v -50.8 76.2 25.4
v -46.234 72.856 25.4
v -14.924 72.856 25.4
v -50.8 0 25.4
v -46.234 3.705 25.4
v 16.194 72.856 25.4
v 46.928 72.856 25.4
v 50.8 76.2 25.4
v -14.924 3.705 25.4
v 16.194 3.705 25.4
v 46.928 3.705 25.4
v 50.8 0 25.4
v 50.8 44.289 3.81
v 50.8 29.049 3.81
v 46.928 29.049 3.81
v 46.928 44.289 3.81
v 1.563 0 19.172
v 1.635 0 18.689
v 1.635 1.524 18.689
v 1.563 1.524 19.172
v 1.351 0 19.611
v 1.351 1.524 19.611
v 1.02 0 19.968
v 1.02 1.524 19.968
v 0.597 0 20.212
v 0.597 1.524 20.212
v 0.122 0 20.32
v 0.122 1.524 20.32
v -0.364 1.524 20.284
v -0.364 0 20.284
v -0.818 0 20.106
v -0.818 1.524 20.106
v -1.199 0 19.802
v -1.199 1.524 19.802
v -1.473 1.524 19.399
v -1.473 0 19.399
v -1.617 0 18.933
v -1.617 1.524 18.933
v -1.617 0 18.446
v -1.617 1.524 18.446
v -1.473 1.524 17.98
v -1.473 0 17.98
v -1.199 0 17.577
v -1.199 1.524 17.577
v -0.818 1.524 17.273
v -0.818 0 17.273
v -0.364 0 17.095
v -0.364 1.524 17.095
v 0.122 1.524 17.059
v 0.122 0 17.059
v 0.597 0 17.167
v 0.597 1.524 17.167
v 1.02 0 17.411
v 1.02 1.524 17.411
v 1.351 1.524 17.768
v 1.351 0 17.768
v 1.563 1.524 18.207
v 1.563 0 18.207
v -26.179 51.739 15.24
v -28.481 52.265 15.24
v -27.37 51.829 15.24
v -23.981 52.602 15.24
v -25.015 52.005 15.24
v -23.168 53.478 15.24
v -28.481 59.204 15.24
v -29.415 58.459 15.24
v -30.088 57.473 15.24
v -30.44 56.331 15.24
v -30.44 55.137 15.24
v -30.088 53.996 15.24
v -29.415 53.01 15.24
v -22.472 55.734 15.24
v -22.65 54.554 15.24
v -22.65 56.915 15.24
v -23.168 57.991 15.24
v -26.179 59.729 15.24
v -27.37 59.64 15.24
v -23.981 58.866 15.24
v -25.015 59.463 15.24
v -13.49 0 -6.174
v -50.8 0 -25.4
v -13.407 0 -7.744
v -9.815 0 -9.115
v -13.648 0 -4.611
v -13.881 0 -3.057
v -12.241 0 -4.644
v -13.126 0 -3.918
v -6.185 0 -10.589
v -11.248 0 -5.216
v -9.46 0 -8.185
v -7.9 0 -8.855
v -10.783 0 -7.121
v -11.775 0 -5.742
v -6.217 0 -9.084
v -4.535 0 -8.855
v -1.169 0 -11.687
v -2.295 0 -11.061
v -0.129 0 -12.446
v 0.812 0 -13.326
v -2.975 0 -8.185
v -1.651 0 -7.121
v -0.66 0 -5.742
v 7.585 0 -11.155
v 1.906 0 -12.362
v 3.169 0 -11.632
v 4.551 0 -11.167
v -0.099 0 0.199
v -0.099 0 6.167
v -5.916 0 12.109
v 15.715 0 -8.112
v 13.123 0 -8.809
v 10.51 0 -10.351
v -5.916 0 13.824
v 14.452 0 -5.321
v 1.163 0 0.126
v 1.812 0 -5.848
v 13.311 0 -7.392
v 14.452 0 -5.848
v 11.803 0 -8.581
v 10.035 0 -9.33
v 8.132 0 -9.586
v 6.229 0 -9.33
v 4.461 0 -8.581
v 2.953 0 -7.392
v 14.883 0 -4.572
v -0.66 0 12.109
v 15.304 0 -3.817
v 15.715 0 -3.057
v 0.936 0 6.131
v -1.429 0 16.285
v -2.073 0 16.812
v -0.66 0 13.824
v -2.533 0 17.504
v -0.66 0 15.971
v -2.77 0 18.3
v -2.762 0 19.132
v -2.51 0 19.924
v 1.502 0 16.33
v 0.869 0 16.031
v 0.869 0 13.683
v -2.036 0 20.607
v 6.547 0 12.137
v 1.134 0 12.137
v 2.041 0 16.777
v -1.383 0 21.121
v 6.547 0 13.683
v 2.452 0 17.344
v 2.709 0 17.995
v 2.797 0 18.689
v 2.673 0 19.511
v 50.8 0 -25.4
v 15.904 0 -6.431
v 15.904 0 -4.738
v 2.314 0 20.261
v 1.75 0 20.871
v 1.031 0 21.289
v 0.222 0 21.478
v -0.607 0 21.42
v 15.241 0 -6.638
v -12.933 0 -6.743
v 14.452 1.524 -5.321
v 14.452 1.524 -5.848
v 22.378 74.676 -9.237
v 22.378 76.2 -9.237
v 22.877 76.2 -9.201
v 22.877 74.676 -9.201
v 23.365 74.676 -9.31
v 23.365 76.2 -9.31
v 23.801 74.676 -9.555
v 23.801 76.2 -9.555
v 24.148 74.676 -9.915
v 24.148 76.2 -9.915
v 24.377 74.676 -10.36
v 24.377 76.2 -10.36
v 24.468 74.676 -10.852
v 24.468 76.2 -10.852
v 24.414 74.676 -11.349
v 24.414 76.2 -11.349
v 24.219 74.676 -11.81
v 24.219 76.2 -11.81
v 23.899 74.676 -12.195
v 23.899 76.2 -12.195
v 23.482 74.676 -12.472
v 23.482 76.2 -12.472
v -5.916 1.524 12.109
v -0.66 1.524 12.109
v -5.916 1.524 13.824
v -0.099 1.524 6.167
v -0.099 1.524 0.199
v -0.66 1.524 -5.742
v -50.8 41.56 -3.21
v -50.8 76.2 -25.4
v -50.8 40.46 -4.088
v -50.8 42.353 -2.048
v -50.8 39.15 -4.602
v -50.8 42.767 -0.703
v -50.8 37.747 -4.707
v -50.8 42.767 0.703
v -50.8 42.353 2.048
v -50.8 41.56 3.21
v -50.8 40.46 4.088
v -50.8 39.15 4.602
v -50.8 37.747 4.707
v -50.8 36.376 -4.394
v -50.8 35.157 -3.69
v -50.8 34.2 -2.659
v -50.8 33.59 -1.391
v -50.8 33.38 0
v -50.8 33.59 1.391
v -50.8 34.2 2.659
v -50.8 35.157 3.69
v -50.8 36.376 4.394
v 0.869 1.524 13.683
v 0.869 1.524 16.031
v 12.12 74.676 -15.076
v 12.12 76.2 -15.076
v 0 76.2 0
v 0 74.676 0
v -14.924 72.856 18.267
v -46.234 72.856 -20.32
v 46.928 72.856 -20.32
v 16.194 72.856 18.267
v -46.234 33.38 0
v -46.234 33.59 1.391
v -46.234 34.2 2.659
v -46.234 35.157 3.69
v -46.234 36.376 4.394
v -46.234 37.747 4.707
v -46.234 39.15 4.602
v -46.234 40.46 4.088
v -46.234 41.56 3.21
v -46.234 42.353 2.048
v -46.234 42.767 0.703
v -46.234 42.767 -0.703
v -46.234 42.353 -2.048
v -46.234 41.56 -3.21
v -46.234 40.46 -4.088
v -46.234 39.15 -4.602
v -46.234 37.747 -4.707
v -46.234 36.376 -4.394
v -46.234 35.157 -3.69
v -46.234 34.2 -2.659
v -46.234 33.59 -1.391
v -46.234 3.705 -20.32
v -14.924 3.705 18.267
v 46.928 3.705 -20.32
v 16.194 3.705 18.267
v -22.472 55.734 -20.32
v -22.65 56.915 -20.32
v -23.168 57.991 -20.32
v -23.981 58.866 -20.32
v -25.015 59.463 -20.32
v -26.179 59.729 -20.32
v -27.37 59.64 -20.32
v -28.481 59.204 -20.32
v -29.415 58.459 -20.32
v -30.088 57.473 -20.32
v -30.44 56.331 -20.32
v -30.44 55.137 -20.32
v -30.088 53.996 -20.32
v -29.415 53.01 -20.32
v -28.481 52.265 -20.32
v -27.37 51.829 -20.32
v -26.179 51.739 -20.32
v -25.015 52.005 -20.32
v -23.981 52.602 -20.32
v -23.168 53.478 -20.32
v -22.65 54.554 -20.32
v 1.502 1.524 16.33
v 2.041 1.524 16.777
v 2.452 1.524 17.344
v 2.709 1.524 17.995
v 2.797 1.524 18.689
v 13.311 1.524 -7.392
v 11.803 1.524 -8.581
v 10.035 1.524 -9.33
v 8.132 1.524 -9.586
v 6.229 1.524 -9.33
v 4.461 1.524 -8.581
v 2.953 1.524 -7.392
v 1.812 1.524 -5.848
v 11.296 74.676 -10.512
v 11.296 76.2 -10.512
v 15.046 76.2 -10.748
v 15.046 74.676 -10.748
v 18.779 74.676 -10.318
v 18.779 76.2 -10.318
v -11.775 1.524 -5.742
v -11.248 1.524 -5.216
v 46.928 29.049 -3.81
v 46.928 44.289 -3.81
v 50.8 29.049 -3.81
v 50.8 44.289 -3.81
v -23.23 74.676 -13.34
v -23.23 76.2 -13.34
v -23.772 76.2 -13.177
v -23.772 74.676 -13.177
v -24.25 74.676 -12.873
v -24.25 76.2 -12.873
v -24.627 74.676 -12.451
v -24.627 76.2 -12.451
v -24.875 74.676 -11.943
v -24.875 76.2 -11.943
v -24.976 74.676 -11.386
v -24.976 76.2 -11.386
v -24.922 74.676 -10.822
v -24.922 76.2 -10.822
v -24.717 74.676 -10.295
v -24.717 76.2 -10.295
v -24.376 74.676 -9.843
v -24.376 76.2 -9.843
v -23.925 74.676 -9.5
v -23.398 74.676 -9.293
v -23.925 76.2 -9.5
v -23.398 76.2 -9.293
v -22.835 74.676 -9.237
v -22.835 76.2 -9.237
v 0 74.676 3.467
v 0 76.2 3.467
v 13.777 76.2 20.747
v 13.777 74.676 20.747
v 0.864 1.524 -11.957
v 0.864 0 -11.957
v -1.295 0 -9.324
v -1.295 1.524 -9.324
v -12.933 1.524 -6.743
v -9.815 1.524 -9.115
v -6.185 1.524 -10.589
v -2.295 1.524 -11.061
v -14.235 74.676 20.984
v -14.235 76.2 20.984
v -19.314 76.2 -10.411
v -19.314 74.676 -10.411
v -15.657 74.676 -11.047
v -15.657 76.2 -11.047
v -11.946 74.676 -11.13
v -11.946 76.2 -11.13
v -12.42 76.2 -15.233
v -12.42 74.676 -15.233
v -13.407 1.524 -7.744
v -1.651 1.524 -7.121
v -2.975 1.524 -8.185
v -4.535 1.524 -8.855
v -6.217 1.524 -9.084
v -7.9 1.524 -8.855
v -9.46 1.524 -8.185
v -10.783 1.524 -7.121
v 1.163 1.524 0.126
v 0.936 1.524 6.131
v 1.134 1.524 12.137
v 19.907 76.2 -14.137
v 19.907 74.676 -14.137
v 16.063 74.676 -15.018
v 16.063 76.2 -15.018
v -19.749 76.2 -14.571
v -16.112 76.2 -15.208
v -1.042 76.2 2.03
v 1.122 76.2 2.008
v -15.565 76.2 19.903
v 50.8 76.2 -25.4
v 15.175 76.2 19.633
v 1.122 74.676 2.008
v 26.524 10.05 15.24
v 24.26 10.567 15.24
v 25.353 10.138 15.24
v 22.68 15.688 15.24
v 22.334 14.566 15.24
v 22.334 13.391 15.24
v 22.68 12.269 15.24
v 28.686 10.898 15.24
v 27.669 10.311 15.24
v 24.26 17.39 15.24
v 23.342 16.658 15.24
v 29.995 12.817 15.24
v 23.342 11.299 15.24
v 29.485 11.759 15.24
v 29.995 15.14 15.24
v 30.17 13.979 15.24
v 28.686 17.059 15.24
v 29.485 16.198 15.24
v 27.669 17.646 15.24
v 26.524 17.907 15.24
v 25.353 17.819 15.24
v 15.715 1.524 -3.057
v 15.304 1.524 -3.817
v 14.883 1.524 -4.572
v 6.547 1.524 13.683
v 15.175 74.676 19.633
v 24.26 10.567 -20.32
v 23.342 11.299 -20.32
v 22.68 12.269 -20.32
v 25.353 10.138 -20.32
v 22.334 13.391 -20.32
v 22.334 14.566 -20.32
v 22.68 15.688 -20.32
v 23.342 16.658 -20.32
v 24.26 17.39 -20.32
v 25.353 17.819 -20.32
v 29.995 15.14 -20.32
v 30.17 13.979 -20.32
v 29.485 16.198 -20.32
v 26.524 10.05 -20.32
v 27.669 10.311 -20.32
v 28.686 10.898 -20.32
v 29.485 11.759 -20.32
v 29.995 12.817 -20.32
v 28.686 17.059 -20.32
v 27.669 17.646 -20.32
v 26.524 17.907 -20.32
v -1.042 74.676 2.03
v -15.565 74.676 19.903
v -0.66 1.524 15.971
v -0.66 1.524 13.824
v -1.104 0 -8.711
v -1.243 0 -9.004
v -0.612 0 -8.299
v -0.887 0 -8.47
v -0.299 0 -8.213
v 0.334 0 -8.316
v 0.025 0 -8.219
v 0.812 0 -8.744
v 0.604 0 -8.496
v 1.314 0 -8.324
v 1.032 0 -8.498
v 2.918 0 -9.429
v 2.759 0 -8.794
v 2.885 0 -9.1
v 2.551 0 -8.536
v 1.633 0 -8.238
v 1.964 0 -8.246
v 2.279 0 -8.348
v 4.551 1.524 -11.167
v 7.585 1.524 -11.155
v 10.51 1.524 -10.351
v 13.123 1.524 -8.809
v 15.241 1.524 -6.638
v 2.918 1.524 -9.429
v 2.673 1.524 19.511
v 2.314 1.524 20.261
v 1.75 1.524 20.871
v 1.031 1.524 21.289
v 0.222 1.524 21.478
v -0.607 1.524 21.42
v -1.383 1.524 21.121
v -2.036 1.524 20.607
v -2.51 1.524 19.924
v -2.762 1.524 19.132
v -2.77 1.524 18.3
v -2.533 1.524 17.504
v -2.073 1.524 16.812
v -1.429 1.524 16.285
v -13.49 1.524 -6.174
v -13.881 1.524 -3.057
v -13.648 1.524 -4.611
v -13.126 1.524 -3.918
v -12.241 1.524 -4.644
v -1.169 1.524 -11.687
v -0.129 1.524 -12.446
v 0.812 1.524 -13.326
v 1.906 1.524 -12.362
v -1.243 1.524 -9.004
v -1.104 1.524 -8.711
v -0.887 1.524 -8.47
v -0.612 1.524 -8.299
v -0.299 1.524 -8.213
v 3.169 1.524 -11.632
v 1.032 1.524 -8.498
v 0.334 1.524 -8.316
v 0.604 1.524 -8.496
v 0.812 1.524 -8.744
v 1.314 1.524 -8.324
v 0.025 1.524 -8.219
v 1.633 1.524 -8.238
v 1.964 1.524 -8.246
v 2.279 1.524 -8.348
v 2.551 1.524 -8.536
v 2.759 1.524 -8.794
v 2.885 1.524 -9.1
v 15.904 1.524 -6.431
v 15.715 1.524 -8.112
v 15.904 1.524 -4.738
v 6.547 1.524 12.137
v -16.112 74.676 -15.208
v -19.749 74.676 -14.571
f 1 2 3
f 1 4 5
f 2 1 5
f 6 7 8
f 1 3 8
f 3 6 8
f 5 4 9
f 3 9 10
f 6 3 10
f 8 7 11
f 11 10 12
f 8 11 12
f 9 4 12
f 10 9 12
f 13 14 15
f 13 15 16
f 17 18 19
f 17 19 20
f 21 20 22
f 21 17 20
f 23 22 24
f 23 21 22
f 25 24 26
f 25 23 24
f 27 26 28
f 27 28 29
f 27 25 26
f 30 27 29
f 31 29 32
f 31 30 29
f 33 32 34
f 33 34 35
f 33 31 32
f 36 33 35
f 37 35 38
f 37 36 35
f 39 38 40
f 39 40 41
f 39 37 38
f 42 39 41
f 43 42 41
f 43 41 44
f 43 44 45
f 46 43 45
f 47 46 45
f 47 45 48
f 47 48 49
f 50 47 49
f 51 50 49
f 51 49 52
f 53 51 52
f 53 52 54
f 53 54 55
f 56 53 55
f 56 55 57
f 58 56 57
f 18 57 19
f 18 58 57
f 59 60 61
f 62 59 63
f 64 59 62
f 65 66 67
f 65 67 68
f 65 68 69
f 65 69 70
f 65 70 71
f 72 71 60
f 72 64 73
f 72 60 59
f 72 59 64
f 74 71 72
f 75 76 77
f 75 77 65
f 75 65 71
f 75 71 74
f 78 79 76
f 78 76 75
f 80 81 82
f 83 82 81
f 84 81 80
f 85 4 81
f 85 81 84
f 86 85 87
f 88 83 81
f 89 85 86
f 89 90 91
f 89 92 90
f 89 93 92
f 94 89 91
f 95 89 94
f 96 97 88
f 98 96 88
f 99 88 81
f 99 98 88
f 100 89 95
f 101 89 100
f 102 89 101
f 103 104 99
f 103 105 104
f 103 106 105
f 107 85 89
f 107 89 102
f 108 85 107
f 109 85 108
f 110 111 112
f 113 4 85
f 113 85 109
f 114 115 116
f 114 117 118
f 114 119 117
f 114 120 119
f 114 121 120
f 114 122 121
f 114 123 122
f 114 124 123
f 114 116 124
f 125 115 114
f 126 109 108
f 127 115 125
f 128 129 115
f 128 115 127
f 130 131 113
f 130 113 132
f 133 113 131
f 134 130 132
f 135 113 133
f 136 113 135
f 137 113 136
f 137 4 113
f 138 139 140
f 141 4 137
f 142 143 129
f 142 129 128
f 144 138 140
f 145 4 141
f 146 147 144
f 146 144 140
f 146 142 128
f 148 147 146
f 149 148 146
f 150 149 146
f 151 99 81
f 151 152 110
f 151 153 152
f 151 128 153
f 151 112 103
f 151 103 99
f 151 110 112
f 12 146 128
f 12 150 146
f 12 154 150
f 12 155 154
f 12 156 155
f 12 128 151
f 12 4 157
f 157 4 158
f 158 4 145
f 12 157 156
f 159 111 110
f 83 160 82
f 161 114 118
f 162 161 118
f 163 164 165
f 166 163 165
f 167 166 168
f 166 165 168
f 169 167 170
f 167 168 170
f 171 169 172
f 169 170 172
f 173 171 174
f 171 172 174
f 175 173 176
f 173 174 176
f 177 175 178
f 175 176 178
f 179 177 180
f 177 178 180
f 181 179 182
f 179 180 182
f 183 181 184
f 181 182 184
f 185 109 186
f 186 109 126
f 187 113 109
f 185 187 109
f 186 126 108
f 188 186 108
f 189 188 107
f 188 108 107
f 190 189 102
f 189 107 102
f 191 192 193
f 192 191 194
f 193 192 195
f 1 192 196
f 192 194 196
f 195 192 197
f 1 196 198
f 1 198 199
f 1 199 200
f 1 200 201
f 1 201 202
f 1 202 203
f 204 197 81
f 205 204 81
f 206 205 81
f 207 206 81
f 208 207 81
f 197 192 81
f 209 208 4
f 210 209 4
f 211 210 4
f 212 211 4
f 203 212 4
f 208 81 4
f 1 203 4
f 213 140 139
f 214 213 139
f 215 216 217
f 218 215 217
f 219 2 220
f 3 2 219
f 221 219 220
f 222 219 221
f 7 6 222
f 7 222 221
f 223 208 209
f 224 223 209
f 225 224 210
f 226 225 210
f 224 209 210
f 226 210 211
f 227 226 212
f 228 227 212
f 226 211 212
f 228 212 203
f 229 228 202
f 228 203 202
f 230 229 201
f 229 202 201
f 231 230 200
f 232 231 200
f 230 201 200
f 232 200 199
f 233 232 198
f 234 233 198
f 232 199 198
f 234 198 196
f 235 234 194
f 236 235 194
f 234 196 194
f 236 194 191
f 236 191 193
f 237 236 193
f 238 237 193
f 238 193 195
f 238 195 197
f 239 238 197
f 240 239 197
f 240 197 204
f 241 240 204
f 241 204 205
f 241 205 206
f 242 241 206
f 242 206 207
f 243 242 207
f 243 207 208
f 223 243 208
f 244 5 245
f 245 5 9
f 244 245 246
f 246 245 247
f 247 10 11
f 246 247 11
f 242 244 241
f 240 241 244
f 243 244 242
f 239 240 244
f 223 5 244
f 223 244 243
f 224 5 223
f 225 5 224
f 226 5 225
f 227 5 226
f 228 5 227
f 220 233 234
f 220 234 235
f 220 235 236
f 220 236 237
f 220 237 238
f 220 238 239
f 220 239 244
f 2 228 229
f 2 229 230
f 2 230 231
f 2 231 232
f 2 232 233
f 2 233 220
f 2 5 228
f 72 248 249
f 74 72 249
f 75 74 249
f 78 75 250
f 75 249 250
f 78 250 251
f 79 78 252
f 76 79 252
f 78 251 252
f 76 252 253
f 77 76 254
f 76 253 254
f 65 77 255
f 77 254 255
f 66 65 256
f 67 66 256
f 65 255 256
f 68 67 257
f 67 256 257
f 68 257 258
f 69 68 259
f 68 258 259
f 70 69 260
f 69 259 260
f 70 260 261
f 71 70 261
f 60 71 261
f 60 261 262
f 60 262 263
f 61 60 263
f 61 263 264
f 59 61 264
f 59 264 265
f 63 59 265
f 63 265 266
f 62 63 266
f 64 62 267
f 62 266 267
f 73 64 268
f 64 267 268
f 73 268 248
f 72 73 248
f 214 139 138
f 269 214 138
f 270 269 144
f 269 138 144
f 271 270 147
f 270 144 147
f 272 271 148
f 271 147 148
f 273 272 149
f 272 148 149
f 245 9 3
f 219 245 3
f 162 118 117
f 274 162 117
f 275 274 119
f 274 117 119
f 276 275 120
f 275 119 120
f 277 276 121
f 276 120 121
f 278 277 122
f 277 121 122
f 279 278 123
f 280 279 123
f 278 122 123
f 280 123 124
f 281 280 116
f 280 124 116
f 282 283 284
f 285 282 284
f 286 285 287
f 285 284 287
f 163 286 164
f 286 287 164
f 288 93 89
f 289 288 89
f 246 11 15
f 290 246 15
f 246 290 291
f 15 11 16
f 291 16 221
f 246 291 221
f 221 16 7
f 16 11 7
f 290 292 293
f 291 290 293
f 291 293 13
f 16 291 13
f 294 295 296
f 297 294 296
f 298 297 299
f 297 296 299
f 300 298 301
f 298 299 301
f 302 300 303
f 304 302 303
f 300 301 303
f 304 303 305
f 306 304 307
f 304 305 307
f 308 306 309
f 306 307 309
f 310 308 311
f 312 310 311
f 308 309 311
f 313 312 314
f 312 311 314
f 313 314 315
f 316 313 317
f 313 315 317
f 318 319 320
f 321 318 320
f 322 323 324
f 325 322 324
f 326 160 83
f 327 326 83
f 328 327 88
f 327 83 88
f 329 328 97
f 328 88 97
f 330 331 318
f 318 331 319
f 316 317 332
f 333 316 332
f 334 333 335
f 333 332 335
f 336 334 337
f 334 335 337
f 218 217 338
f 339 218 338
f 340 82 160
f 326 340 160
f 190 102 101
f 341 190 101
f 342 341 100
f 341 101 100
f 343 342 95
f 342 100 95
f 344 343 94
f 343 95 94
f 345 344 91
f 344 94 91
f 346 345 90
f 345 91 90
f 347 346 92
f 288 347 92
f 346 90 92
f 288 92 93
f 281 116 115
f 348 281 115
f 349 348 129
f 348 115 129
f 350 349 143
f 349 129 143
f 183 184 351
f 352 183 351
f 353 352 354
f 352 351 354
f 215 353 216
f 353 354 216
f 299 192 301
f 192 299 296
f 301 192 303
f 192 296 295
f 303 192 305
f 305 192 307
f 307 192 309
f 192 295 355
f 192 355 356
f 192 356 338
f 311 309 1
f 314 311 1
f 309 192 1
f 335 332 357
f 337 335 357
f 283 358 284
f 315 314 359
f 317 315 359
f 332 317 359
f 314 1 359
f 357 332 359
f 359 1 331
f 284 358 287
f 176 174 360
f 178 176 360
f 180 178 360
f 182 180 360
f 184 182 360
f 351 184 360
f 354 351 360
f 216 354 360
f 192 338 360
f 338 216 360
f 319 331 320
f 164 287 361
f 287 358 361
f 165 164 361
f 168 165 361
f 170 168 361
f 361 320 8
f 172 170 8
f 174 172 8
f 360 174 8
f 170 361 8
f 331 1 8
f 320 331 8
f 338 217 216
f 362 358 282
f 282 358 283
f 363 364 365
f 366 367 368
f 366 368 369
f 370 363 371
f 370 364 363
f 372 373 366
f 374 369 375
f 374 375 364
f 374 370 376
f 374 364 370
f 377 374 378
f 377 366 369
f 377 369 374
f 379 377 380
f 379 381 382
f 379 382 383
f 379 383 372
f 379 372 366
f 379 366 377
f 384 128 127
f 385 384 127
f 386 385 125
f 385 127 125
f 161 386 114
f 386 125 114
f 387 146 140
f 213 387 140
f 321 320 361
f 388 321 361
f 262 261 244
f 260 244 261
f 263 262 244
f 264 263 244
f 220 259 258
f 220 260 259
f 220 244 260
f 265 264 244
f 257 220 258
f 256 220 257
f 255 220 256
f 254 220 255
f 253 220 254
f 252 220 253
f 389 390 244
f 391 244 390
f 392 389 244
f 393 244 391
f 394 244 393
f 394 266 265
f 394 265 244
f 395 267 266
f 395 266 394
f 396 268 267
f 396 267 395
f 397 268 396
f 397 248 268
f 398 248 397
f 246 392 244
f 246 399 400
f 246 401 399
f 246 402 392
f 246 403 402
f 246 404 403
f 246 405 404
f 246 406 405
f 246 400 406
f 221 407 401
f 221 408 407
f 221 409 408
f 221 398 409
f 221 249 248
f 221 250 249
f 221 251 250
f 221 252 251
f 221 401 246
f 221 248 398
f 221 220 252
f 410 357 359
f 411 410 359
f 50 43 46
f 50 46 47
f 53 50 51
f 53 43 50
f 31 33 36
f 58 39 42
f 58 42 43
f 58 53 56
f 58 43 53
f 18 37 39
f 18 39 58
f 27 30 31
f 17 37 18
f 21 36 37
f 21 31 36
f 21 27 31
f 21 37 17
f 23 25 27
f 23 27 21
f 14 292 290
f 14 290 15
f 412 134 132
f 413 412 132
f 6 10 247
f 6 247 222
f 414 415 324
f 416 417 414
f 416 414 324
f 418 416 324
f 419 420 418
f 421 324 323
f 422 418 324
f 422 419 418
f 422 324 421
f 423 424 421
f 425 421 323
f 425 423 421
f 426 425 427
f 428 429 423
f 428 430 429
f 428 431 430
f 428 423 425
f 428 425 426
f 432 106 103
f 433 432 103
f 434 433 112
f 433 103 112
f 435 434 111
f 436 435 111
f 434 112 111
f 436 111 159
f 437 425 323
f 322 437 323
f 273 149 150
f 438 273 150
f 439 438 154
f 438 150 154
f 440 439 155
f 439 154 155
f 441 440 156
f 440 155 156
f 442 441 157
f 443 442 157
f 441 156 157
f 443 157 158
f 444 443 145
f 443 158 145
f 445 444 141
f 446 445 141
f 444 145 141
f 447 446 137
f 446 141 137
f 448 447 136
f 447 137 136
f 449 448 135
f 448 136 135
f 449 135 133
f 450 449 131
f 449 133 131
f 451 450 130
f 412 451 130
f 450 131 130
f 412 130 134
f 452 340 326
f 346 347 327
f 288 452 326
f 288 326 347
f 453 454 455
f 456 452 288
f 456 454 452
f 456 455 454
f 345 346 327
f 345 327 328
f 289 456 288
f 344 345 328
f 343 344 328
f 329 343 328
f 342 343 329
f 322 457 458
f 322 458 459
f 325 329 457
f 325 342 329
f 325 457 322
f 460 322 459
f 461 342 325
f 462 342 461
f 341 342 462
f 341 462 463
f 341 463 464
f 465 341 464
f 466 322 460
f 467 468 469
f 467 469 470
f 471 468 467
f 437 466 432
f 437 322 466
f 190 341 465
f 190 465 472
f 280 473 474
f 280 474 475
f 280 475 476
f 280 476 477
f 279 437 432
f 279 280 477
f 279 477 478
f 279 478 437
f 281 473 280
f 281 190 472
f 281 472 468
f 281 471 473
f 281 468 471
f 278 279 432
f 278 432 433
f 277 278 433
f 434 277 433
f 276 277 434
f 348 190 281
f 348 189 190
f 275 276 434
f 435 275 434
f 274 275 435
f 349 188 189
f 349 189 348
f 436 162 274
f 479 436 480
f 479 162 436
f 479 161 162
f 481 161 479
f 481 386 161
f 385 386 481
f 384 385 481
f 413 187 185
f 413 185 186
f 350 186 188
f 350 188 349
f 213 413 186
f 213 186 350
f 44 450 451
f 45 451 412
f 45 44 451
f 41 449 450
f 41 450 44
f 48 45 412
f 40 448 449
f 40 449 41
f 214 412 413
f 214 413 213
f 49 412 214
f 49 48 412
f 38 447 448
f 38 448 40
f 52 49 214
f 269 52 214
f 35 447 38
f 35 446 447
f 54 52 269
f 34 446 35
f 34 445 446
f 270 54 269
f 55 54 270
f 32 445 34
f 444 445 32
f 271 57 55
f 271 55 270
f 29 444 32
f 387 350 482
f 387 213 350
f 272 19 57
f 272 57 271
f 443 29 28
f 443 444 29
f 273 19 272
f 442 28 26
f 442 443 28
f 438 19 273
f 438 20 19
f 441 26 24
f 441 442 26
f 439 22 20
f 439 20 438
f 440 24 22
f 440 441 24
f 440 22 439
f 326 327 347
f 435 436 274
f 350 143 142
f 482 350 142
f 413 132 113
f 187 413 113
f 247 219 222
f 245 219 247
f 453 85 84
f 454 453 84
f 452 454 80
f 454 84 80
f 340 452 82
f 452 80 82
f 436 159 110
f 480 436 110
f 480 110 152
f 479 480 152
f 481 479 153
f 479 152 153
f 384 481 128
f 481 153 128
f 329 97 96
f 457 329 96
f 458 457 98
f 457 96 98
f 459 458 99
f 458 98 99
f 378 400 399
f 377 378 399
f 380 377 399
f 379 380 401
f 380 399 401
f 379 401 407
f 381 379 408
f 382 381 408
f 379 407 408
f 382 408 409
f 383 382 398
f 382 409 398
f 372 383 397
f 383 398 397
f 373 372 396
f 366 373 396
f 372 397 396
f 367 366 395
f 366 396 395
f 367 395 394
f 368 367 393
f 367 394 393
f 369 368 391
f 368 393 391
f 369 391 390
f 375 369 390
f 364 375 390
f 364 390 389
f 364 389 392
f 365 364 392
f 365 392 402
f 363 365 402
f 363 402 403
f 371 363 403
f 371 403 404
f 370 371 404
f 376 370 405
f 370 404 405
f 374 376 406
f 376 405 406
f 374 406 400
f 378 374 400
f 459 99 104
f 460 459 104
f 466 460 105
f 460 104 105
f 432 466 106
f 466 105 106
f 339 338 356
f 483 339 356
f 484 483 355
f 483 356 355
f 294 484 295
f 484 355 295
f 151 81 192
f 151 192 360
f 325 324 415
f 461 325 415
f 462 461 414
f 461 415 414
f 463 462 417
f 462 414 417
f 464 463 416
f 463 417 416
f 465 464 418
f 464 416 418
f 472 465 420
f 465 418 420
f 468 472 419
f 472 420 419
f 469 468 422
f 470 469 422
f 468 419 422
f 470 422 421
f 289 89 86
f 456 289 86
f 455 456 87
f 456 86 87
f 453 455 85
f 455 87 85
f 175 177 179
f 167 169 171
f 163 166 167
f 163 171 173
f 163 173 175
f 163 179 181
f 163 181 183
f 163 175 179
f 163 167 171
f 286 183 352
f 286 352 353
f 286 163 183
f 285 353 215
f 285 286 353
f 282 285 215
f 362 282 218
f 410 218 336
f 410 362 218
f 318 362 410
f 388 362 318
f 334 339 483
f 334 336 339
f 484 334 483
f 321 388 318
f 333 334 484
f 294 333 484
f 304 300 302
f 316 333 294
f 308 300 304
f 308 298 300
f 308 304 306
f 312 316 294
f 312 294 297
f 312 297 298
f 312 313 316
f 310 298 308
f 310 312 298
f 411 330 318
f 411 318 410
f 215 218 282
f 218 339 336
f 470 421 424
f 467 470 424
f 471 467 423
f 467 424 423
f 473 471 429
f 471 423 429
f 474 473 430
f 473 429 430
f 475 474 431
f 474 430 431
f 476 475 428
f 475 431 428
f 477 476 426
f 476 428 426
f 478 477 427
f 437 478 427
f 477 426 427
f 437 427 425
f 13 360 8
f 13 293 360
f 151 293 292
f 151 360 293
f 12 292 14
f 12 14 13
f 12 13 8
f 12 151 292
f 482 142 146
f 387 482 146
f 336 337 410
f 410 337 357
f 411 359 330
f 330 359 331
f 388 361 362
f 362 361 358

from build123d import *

# Parameters (mm, degrees)
F0_W      = 101.6
F0_H      = 50.8
F1_DEPTH  = 76.2
F2_W      = 31.3102314249
F2_H      = 69.1514285281
F2_W_2    = 30.7339653373
F3_DEPTH  = 45.72
F4_W      = 69.1514285281
F4_H      = 38.5872757655
F5_DEPTH  = 50.8
F6_W      = 15.24
F6_H      = 7.62
F7_DEPTH  = 10.16
F8_R      = 4.7199680321
F9_DEPTH  = 12.7
F10_R     = 1.635365768
F11_DEPTH = 1.524
F13_DEPTH = 1.524
F14_R     = 4.0060593356
F14_R_2   = 3.939714961
F15_DEPTH = 35.56


with BuildPart() as f1:
    # F0 (on Front) → F1 (new body)
    with BuildSketch(Plane.XZ):
        Rectangle(F0_W, F0_H)
    extrude(amount=-F1_DEPTH)

    # F2 (on face) → F3 (cut)
    with BuildSketch(Plane.XY.offset(25.4)):
        with Locations((-30.5790114217, 38.2802202366)):
            Rectangle(F2_W, F2_H)
        with Locations((31.561229378, 38.2802202366)):
            Rectangle(F2_W_2, F2_H)
    extrude(amount=-F3_DEPTH, mode=Mode.SUBTRACT)

    # F4 (on face) → F5 (cut)
    with BuildSketch(Plane(origin=(-14.9238957092, 0, 0), x_dir=(0, -1, 0), z_dir=(-1, 0, 0))):
        with Locations((-38.2802202366, -1.0263621172)):
            Rectangle(F4_W, F4_H)
    extrude(amount=-F5_DEPTH, mode=Mode.SUBTRACT)

    # F6 (on face) → F7 (cut)
    with BuildSketch(Plane.YZ.offset(50.8)):
        with Locations((36.6688001752, 0)):
            Rectangle(F6_W, F6_H)
    extrude(amount=-F7_DEPTH, mode=Mode.SUBTRACT)

    # F8 (on face) → F9 (cut)
    with BuildSketch(Plane(origin=(-50.8, 0, 0), x_dir=(0, -1, 0), z_dir=(-1, 0, 0))):
        with Locations((-38.1, 0)):
            Circle(F8_R)
    extrude(amount=-F9_DEPTH, mode=Mode.SUBTRACT)

    # F10 (on face) → F11 (cut)
    with BuildSketch(Plane.XZ):
        with BuildLine():
            ThreePointArc((0.8688539046, 16.0308553601), (2.2642224031, 17.0473777803), (2.7970019822, 18.6894852668))
            ThreePointArc((2.7970019822, 18.6894852668), (-1.728877271, 20.8881674789), (-0.6597016604, 15.9713951639))
            ThreePointArc((-0.6597016604, 15.9713951639), (0.108720026, 15.8945970679), (0.8688539046, 16.0308553601))
        make_face()
        with Locations((0, 18.6894852668)):
            Circle(F10_R, mode=Mode.SUBTRACT)
        with BuildLine():
            ThreePointArc((0.8688539046, 16.0308553601), (0.108720026, 15.8945970679), (-0.6597016604, 15.9713951639))
            Line((-0.6597016604, 15.9713951639), (-0.6597016604, 13.8239324768))
            Line((-0.6597016604, 13.8239324768), (-5.9159405627, 13.8239324768))
            Line((-5.9159405627, 13.8239324768), (-5.9159405627, 12.1085410579))
            Line((-5.9159405627, 12.1085410579), (-0.6597016604, 12.1085410579))
            ThreePointArc((-0.6597016604, 12.1085410579), (-0.0288400906, 3.1830218907), (-0.6597016604, -5.7424972765))
            ThreePointArc((-0.6597016604, -5.7424972765), (-6.2171832026, -9.0842868218), (-11.7746647447, -5.7424972765))
            Line((-11.7746647447, -5.7424972765), (-11.2480353564, -5.2158674225))
            ThreePointArc((-11.2480353564, -5.2158674225), (-12.6984808292, -4.2995334354), (-13.8811841607, -3.0566847418))
            ThreePointArc((-13.8811841607, -3.0566847418), (-13.5599978183, -5.3916725495), (-13.4072173387, -7.7436901629))
            Line((-13.4072173387, -7.7436901629), (-12.9332505167, -6.7430939525))
            ThreePointArc((-12.9332505167, -6.7430939525), (-8.0485977202, -9.9721592901), (-2.29532714, -11.0614588484))
            ThreePointArc((-2.29532714, -11.0614588484), (-0.6373782355, -12.0504785864), (0.8117884863, -13.3259668946))
            ThreePointArc((0.8117884863, -13.3259668946), (2.5191788748, -11.9655868759), (4.5508607291, -11.1667849123))
            ThreePointArc((4.5508607291, -11.1667849123), (10.5097684759, -10.3506913543), (15.2414478362, -6.6377678886))
            Line((15.2414478362, -6.6377678886), (15.7154146582, -8.112330921))
            ThreePointArc((15.7154146582, -8.112330921), (15.9275295852, -5.5845078314), (15.7154146582, -3.0566847418))
            ThreePointArc((15.7154146582, -3.0566847418), (15.0946685939, -4.1951955449), (14.4515028223, -5.3211930208))
            Line((14.4515028223, -5.3211930208), (14.4515028223, -5.8478228748))
            ThreePointArc((14.4515028223, -5.8478228748), (8.131944458, -9.5855520976), (1.8123860937, -5.8478228748))
            ThreePointArc((1.8123860937, -5.8478228748), (0.996836842, 3.1265252312), (1.1337217875, 12.1368141845))
            Line((1.1337217875, 12.1368141845), (6.5465644002, 12.1368141845))
            Line((6.5465644002, 12.1368141845), (6.5465644002, 13.683338151))
            Line((6.5465644002, 13.683338151), (0.8688539046, 13.683338151))
            Line((0.8688539046, 13.683338151), (0.8688539046, 16.0308553601))
        make_face()
        with BuildLine():
            ThreePointArc((0.8117884863, -8.7442873046), (2.1252827801, -8.2858759495), (2.9183086008, -9.4289062545))
            Line((2.9183086008, -9.4289062545), (0.8644514601, -11.9567289948))
            Line((0.8644514601, -11.9567289948), (-1.2947305804, -9.3235801905))
            ThreePointArc((-1.2947305804, -9.3235801905), (-0.4584292651, -8.2449949671), (0.8117884863, -8.7442873046))
        make_face(mode=Mode.SUBTRACT)
    extrude(amount=-F11_DEPTH, mode=Mode.SUBTRACT)

    # F12 (on face) → F13 (cut)
    with BuildSketch(Plane(origin=(0, 76.2, 0), x_dir=(-1, 0, 0), z_dir=(0, 1, 0))):
        with BuildLine():
            Line((14.2345046625, 20.9841318429), (0, 3.4671491012))
            Line((0, 3.4671491012), (-13.7768853456, 20.7474157214))
            Line((-13.7768853456, 20.7474157214), (-15.1745732773, 19.6330934249))
            Line((-15.1745732773, 19.6330934249), (-1.1224173427, 2.0075565166))
            Line((-1.1224173427, 2.0075565166), (-11.2962679055, -10.512384918))
            ThreePointArc((-11.2962679055, -10.512384918), (-16.9222450094, -10.615651057), (-22.3775655031, -9.2366077006))
            ThreePointArc((-22.3775655031, -9.2366077006), (-24.377281906, -10.3599397452), (-23.4822407365, -12.4717261642))
            ThreePointArc((-23.4822407365, -12.4717261642), (-18.0084948263, -14.6788471986), (-12.1198734269, -15.0756035))
            Line((-12.1198734269, -15.0756035), (0, 0))
            Line((0, 0), (12.4196829274, -15.2334133163))
            ThreePointArc((12.4196829274, -15.2334133163), (17.9436167829, -14.9653793634), (23.2297126204, -13.3396862075))
            ThreePointArc((23.2297126204, -13.3396862075), (24.9682567409, -11.1020125383), (22.835187614, -9.2366077006))
            ThreePointArc((22.835187614, -9.2366077006), (17.49741351, -10.7969617685), (11.9462516159, -11.1303366721))
            Line((11.9462516159, -11.1303366721), (1.0416547929, 2.0300080541))
            Line((1.0416547929, 2.0300080541), (15.5652534262, 19.9027498628))
            Line((15.5652534262, 19.9027498628), (14.2345046625, 20.9841318429))
        make_face()
    extrude(amount=-F13_DEPTH, mode=Mode.SUBTRACT)

    # F14 (on face) → F15 (join)
    with BuildSketch(Plane.XY.offset(-20.32)):
        with Locations((-26.4782663435, 55.7343438268)):
            Circle(F14_R)
        with Locations((26.2298732996, 13.9785446227)):
            Circle(F14_R_2)
    extrude(amount=F15_DEPTH)


solid = f1.part
